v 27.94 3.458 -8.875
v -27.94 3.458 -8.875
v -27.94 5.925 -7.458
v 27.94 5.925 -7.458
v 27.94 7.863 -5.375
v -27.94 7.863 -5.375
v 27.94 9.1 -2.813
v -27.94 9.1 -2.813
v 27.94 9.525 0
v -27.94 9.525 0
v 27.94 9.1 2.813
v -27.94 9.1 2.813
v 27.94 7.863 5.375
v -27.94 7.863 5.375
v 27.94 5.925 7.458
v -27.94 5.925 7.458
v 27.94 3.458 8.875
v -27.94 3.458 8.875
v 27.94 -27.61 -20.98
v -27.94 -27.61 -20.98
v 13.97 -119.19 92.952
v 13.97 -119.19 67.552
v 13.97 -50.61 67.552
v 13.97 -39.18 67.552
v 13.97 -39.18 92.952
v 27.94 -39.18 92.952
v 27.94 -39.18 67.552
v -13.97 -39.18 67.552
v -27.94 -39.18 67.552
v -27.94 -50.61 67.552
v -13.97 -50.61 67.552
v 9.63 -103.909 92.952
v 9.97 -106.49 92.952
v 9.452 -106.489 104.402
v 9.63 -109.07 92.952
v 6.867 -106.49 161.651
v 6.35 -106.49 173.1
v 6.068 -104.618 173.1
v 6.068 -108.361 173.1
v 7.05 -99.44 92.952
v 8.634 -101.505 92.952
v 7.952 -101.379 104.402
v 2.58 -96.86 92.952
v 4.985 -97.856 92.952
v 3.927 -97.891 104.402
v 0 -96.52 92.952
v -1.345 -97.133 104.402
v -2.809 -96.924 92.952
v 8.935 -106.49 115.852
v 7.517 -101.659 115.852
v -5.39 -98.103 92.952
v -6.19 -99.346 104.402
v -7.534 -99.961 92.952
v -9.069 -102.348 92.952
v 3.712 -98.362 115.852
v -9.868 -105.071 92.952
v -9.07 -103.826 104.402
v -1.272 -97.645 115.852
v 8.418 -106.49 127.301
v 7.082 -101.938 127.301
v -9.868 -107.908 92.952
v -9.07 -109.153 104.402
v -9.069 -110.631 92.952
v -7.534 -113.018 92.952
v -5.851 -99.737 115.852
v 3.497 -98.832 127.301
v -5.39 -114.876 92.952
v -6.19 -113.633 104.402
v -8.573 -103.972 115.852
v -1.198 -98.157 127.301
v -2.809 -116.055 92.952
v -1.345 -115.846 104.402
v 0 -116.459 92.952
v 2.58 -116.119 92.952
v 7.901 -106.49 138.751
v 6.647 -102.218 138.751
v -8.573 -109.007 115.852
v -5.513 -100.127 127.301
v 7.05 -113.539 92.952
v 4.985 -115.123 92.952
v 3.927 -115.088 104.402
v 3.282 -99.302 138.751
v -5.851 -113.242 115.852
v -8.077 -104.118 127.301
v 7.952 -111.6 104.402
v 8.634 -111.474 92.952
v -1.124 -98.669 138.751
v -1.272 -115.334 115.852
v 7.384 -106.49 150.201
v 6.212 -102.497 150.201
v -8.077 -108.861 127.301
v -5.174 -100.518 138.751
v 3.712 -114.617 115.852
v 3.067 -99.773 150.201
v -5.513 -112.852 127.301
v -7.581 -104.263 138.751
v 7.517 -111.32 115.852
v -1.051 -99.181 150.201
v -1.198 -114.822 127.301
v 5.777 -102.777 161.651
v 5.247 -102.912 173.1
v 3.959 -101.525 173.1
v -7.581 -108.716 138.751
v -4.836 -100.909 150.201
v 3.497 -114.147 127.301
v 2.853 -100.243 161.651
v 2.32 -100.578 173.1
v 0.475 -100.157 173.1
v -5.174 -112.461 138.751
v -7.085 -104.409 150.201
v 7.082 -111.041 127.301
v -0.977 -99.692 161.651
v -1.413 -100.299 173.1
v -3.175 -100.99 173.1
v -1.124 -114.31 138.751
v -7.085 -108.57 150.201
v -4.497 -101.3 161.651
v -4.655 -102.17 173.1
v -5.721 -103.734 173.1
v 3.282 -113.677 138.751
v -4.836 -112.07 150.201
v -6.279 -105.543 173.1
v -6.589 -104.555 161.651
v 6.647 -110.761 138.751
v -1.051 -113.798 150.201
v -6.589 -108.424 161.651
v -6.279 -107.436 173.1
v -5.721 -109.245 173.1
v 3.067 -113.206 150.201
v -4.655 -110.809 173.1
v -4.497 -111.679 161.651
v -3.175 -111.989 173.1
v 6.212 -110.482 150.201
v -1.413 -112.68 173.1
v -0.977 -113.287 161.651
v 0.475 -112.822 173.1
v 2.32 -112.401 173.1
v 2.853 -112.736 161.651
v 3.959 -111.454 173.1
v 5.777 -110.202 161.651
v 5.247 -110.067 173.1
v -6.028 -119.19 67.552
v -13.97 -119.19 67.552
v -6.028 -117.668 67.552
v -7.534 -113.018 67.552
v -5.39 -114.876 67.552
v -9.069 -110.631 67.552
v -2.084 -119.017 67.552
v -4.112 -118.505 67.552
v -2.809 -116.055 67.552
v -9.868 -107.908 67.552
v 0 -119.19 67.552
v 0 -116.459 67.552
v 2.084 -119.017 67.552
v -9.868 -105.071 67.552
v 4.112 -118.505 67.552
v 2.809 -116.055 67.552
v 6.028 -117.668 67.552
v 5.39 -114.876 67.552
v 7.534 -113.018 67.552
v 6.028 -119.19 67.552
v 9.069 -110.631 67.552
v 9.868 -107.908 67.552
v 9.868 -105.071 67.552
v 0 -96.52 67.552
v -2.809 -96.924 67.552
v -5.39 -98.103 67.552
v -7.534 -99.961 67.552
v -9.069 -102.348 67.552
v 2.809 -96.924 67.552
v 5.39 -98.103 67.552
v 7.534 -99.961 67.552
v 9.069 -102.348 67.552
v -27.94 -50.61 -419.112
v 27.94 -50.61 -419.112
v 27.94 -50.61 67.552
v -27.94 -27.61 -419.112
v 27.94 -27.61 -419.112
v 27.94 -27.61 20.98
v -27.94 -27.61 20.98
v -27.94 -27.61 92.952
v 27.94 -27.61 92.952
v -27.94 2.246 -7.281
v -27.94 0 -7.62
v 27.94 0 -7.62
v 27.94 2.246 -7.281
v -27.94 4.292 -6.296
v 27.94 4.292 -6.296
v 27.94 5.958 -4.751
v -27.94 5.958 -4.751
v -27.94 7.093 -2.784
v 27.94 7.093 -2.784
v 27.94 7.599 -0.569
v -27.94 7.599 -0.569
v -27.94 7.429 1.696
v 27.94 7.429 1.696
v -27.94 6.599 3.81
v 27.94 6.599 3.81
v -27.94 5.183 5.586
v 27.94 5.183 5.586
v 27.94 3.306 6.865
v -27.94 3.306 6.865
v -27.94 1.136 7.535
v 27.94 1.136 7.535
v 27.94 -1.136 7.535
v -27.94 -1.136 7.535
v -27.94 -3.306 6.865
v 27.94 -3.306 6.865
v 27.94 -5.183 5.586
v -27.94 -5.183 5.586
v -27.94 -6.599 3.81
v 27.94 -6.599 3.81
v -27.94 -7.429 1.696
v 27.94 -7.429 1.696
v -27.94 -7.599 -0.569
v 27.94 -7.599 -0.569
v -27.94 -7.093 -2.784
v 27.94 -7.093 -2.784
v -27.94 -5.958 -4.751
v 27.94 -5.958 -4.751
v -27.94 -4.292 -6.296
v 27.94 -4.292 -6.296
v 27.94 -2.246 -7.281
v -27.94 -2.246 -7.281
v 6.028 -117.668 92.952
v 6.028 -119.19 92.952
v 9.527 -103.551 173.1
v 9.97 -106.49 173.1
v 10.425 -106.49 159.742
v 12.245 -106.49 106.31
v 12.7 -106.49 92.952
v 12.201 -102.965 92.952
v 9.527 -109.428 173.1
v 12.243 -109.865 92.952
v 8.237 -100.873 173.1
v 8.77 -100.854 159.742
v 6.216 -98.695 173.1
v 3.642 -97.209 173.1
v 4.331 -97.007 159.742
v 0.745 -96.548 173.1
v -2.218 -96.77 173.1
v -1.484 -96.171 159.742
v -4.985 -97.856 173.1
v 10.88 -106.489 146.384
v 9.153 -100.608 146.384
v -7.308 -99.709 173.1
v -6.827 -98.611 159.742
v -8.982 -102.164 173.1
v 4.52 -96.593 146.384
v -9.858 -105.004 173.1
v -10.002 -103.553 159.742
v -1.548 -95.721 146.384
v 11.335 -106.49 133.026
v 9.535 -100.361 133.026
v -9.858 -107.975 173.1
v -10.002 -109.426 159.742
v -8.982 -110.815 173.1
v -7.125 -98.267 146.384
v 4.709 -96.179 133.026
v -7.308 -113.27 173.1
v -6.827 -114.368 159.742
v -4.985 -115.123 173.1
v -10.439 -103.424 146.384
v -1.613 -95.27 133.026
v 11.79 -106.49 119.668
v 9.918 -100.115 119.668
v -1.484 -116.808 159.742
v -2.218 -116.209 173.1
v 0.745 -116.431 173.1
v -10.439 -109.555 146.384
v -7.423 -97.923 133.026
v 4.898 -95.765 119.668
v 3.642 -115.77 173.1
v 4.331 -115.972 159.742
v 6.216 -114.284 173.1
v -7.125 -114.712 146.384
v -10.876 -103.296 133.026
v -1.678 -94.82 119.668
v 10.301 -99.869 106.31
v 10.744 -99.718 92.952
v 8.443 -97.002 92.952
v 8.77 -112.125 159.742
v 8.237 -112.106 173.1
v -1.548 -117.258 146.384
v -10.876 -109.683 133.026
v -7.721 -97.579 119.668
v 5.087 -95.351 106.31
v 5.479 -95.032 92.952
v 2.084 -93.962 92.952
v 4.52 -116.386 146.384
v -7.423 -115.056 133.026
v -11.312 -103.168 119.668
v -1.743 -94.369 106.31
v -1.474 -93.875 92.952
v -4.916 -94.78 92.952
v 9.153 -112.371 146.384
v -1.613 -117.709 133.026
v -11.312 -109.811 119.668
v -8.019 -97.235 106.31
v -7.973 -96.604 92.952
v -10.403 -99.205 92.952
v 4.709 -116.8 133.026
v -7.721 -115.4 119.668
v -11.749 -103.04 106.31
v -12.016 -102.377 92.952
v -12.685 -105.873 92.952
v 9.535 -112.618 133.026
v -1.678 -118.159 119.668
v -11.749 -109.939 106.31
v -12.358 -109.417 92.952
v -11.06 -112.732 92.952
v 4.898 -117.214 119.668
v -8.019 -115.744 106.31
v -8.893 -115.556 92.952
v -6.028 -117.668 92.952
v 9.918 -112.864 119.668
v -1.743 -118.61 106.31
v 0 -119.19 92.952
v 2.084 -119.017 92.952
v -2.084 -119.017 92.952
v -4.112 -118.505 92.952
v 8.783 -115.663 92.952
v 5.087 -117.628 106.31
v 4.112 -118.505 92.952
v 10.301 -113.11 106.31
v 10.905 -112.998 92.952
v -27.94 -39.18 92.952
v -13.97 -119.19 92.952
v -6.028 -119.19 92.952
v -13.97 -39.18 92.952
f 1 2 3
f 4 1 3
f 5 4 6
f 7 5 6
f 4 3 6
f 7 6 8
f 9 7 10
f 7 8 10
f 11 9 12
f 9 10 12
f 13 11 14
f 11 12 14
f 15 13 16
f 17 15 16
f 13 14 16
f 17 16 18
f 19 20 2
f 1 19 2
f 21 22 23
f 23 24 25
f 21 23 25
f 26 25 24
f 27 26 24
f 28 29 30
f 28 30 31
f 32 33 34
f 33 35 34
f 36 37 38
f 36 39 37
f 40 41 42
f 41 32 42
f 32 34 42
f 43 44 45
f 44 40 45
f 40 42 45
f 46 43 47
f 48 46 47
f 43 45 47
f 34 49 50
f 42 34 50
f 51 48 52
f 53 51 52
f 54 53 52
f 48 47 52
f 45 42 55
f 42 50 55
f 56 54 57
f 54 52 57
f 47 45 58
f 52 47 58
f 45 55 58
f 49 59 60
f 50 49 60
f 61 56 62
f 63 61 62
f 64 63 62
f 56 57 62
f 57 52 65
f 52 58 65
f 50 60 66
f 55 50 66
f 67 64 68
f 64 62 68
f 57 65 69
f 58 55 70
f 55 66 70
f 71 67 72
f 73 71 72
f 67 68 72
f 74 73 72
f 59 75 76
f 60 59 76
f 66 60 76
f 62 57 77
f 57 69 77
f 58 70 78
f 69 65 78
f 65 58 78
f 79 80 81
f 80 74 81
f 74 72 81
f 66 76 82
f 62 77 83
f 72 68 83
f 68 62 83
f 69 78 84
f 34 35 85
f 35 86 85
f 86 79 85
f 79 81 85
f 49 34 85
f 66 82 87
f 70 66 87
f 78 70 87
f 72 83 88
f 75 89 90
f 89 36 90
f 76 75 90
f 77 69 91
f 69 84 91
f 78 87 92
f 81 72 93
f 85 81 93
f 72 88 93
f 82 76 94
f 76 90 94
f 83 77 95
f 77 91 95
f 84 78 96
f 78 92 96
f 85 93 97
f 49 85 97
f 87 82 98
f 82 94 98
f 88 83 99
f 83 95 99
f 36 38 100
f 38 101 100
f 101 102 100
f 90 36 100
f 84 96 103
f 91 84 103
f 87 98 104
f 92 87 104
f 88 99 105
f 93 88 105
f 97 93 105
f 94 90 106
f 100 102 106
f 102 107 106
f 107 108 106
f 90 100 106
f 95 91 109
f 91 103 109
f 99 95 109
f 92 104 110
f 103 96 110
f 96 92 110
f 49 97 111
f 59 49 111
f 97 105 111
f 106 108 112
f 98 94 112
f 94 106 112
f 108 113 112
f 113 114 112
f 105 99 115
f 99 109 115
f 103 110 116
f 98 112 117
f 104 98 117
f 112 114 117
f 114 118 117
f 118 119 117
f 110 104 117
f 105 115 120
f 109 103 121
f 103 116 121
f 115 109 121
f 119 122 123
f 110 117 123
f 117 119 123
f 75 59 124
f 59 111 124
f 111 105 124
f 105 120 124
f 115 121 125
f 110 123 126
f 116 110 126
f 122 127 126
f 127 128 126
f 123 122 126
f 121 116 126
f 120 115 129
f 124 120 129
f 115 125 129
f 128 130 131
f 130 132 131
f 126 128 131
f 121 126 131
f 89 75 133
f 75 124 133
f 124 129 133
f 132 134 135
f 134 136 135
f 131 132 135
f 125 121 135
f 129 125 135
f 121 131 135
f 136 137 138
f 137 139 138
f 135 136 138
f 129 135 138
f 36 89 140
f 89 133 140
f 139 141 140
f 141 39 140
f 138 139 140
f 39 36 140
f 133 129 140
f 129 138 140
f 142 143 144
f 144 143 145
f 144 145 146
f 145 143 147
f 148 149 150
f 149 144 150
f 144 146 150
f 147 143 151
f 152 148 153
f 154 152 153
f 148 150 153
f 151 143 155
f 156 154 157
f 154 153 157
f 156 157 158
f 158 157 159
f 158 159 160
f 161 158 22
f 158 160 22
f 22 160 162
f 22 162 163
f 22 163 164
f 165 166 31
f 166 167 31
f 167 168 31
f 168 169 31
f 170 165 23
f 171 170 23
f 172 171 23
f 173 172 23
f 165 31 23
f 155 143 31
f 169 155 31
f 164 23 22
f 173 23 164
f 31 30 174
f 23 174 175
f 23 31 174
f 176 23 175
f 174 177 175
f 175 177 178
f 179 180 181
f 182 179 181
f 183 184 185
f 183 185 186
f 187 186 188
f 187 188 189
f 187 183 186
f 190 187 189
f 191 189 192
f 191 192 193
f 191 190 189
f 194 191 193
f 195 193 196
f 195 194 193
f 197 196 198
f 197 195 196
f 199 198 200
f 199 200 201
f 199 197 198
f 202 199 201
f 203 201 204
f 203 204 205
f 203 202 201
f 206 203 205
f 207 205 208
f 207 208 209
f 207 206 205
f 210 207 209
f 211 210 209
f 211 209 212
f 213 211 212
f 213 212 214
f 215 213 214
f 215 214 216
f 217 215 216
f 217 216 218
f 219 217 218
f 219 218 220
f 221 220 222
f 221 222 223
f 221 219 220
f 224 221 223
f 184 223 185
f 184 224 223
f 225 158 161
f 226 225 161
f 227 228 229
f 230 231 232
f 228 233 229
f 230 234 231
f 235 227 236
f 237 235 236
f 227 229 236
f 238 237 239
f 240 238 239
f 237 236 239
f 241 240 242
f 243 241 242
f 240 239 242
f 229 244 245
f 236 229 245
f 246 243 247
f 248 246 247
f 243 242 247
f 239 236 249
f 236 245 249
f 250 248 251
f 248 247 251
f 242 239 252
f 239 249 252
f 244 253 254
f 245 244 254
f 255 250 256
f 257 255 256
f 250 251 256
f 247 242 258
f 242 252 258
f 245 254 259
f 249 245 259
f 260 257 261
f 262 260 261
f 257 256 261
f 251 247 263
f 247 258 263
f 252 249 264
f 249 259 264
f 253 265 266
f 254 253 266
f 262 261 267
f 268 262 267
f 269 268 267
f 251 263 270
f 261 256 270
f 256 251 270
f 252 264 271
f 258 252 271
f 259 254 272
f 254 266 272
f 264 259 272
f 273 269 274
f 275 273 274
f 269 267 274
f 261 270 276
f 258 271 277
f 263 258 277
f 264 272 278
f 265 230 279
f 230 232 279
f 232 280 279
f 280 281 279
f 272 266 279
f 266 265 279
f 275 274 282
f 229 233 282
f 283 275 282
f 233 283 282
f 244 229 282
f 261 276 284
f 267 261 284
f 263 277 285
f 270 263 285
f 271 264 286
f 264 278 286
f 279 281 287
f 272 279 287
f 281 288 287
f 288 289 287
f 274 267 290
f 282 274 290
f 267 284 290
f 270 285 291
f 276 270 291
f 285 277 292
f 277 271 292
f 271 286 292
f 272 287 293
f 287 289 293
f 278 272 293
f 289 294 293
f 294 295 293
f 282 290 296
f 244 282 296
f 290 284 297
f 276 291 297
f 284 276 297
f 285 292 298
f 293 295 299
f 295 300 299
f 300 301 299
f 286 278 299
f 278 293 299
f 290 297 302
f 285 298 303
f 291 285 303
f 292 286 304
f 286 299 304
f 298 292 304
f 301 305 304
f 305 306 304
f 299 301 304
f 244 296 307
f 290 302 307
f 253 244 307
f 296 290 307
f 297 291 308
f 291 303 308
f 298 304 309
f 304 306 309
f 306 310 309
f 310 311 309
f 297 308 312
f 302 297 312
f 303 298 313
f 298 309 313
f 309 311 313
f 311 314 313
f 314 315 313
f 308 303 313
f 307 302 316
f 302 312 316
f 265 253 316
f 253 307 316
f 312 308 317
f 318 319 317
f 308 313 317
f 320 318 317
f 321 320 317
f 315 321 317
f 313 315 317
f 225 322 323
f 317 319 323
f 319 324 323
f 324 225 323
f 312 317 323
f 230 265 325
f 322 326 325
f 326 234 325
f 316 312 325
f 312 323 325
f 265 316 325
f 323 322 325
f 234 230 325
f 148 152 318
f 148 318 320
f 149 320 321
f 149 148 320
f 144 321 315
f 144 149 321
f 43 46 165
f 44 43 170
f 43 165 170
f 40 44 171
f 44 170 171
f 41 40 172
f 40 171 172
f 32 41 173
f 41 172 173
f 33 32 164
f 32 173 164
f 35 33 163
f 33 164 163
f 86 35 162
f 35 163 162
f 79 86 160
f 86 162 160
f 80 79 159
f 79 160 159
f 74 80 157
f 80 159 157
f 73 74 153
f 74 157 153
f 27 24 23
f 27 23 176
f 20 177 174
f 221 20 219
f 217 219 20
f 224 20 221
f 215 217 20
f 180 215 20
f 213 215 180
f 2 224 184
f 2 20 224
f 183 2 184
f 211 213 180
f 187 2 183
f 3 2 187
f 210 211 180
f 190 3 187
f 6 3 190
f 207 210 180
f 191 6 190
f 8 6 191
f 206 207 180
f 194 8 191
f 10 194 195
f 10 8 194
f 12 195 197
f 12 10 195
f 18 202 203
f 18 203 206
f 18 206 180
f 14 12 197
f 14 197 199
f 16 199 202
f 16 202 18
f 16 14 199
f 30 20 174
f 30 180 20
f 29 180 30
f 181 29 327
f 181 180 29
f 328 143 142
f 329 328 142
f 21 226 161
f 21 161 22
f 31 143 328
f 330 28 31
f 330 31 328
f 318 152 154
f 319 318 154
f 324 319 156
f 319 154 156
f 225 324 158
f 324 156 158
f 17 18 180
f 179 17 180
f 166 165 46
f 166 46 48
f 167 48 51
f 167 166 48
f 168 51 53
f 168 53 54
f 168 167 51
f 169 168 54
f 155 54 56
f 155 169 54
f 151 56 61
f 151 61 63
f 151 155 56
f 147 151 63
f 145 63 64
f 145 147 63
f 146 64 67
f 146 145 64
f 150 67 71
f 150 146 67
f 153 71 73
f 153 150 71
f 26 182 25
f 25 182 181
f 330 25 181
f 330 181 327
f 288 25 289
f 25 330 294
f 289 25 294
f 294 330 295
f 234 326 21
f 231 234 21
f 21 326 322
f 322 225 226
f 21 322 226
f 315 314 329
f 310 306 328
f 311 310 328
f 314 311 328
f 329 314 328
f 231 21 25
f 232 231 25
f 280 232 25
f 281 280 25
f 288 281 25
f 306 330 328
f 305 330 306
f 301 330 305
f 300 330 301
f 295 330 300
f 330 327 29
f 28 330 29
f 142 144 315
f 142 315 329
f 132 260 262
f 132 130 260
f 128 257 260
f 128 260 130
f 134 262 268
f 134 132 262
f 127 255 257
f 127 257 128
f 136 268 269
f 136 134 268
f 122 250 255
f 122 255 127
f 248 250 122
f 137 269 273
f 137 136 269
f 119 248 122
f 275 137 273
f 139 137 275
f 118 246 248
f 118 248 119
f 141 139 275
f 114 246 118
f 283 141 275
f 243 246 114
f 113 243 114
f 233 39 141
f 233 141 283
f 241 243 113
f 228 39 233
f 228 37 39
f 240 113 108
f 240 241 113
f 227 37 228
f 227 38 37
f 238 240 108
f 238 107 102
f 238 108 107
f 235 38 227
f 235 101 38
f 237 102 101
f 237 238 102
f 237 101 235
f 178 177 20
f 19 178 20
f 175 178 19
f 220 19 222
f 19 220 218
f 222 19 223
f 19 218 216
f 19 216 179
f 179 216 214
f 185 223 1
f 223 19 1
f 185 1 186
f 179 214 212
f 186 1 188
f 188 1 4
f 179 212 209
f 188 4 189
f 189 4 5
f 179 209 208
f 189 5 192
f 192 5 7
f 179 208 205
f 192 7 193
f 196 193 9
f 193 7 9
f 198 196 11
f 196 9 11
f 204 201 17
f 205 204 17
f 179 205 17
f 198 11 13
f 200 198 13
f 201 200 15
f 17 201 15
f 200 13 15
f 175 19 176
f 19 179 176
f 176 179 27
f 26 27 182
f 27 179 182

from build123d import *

# Parameters (mm, degrees)
BOSS_EXTRUDE2_DEPTH      = 27.94
BOSS_EXTRUDE2_DEPTH_BACK = 27.94
SKETCH3_R                = 7.62
SKETCH4_W                = 27.94
SKETCH4_H                = 25.4
BOSS_EXTRUDE3_DEPTH      = 80.01
CUT_EXTRUDE4_DEPTH       = 25.4
SKETCH9_R                = 9.9695
SKETCH10_R               = 12.7
SKETCH11_R               = 9.9695
SKETCH12_R               = 6.35
SKETCH14_W               = 55.88
SKETCH14_H               = 486.664
BOSS_EXTRUDE5_DEPTH      = 11.43


with BuildPart() as part:
    # Sketch3 → Boss-Extrude2 (new, two sides: drawn at the far end of the back side and taken through both)
    with BuildSketch(Plane(origin=(0, 0, 0), x_dir=(0, 0, -1), z_dir=(1, 0, 0)).offset(-BOSS_EXTRUDE2_DEPTH_BACK)):
        with BuildLine():
            Line((419.112, -27.6098), (28.956316714, -27.6098))
            Line((28.956316714, -27.6098), (20.9804, -27.6098))
            Line((20.9804, -27.6098), (8.875089173, 3.458094441))
            ThreePointArc((8.875089173, 3.458094441), (0, 9.525), (-8.875089173, 3.458094441))
            Line((-8.875089173, 3.458094441), (-20.9804, -27.6098))
            Line((-20.9804, -27.6098), (-28.958958547, -27.6098))
            Line((-28.958958547, -27.6098), (-92.952, -27.6098))
            Line((-92.952, -27.6098), (-92.952, -39.1795))
            Line((-92.952, -39.1795), (419.112, -39.1795))
            Line((419.112, -39.1795), (419.112, -27.6098))
        make_face()
        Circle(SKETCH3_R, mode=Mode.SUBTRACT)
    extrude(amount=BOSS_EXTRUDE2_DEPTH + BOSS_EXTRUDE2_DEPTH_BACK)

    # Sketch4 → Boss-Extrude3 (add)
    with BuildSketch(Plane.XZ.offset(39.1795)):
        with Locations((0, 80.252)):
            Rectangle(SKETCH4_W, SKETCH4_H)
    extrude(amount=BOSS_EXTRUDE3_DEPTH)

    # Sketch5 → Cut-Extrude4 (cut)
    with BuildSketch(Plane(origin=(0, 0, 67.552), x_dir=(-1, 0, 0), z_dir=(0, 0, -1))):
        with BuildLine():
            Line((6.02838635, -117.667539095), (6.02838635, -119.1895))
            Line((6.02838635, -119.1895), (0, -119.1895))
            ThreePointArc((0, -119.1895), (3.108770134, -118.803132618), (6.02838635, -117.667539095))
        make_face()
        with BuildLine():
            Line((0, -116.459), (0, -96.52))
            ThreePointArc((0, -96.52), (9.9695, -106.4895), (0, -116.459))
        make_face()
    cut_extrude4 = extrude(amount=-CUT_EXTRUDE4_DEPTH, mode=Mode.SUBTRACT)

    # Mirror1: Cut-Extrude4 across plane
    add(cut_extrude4.mirror(Plane(origin=(0, -116.459, 115.244479702), x_dir=(0, 0, 1), z_dir=(1, 0, 0))), mode=Mode.SUBTRACT)

    # Sketch9 → Loft1 section 0
    with BuildSketch(Plane.XY.offset(173.10039435)):
        with Locations((0, -106.4895)):
            Circle(SKETCH9_R)
    # Sketch10 → Loft1 section 1
    with BuildSketch(Plane.XY.offset(92.952)):
        with Locations((0, -106.4895)):
            Circle(SKETCH10_R)
    loft()

    # Sketch11 → Cut-Loft1 section 0
    with BuildSketch(Plane.XY.offset(92.952)):
        with Locations((0, -106.4895)):
            Circle(SKETCH11_R)
    # Sketch12 → Cut-Loft1 section 1
    with BuildSketch(Plane.XY.offset(173.10039435)):
        with Locations((0, -106.4895)):
            Circle(SKETCH12_R)
    loft(mode=Mode.SUBTRACT)

    # Sketch14 → Boss-Extrude5 (add)
    with BuildSketch(Plane.XZ.offset(39.1795)):
        with Locations((0, -175.78)):
            Rectangle(SKETCH14_W, SKETCH14_H)
    extrude(amount=BOSS_EXTRUDE5_DEPTH)


solid = part.part
